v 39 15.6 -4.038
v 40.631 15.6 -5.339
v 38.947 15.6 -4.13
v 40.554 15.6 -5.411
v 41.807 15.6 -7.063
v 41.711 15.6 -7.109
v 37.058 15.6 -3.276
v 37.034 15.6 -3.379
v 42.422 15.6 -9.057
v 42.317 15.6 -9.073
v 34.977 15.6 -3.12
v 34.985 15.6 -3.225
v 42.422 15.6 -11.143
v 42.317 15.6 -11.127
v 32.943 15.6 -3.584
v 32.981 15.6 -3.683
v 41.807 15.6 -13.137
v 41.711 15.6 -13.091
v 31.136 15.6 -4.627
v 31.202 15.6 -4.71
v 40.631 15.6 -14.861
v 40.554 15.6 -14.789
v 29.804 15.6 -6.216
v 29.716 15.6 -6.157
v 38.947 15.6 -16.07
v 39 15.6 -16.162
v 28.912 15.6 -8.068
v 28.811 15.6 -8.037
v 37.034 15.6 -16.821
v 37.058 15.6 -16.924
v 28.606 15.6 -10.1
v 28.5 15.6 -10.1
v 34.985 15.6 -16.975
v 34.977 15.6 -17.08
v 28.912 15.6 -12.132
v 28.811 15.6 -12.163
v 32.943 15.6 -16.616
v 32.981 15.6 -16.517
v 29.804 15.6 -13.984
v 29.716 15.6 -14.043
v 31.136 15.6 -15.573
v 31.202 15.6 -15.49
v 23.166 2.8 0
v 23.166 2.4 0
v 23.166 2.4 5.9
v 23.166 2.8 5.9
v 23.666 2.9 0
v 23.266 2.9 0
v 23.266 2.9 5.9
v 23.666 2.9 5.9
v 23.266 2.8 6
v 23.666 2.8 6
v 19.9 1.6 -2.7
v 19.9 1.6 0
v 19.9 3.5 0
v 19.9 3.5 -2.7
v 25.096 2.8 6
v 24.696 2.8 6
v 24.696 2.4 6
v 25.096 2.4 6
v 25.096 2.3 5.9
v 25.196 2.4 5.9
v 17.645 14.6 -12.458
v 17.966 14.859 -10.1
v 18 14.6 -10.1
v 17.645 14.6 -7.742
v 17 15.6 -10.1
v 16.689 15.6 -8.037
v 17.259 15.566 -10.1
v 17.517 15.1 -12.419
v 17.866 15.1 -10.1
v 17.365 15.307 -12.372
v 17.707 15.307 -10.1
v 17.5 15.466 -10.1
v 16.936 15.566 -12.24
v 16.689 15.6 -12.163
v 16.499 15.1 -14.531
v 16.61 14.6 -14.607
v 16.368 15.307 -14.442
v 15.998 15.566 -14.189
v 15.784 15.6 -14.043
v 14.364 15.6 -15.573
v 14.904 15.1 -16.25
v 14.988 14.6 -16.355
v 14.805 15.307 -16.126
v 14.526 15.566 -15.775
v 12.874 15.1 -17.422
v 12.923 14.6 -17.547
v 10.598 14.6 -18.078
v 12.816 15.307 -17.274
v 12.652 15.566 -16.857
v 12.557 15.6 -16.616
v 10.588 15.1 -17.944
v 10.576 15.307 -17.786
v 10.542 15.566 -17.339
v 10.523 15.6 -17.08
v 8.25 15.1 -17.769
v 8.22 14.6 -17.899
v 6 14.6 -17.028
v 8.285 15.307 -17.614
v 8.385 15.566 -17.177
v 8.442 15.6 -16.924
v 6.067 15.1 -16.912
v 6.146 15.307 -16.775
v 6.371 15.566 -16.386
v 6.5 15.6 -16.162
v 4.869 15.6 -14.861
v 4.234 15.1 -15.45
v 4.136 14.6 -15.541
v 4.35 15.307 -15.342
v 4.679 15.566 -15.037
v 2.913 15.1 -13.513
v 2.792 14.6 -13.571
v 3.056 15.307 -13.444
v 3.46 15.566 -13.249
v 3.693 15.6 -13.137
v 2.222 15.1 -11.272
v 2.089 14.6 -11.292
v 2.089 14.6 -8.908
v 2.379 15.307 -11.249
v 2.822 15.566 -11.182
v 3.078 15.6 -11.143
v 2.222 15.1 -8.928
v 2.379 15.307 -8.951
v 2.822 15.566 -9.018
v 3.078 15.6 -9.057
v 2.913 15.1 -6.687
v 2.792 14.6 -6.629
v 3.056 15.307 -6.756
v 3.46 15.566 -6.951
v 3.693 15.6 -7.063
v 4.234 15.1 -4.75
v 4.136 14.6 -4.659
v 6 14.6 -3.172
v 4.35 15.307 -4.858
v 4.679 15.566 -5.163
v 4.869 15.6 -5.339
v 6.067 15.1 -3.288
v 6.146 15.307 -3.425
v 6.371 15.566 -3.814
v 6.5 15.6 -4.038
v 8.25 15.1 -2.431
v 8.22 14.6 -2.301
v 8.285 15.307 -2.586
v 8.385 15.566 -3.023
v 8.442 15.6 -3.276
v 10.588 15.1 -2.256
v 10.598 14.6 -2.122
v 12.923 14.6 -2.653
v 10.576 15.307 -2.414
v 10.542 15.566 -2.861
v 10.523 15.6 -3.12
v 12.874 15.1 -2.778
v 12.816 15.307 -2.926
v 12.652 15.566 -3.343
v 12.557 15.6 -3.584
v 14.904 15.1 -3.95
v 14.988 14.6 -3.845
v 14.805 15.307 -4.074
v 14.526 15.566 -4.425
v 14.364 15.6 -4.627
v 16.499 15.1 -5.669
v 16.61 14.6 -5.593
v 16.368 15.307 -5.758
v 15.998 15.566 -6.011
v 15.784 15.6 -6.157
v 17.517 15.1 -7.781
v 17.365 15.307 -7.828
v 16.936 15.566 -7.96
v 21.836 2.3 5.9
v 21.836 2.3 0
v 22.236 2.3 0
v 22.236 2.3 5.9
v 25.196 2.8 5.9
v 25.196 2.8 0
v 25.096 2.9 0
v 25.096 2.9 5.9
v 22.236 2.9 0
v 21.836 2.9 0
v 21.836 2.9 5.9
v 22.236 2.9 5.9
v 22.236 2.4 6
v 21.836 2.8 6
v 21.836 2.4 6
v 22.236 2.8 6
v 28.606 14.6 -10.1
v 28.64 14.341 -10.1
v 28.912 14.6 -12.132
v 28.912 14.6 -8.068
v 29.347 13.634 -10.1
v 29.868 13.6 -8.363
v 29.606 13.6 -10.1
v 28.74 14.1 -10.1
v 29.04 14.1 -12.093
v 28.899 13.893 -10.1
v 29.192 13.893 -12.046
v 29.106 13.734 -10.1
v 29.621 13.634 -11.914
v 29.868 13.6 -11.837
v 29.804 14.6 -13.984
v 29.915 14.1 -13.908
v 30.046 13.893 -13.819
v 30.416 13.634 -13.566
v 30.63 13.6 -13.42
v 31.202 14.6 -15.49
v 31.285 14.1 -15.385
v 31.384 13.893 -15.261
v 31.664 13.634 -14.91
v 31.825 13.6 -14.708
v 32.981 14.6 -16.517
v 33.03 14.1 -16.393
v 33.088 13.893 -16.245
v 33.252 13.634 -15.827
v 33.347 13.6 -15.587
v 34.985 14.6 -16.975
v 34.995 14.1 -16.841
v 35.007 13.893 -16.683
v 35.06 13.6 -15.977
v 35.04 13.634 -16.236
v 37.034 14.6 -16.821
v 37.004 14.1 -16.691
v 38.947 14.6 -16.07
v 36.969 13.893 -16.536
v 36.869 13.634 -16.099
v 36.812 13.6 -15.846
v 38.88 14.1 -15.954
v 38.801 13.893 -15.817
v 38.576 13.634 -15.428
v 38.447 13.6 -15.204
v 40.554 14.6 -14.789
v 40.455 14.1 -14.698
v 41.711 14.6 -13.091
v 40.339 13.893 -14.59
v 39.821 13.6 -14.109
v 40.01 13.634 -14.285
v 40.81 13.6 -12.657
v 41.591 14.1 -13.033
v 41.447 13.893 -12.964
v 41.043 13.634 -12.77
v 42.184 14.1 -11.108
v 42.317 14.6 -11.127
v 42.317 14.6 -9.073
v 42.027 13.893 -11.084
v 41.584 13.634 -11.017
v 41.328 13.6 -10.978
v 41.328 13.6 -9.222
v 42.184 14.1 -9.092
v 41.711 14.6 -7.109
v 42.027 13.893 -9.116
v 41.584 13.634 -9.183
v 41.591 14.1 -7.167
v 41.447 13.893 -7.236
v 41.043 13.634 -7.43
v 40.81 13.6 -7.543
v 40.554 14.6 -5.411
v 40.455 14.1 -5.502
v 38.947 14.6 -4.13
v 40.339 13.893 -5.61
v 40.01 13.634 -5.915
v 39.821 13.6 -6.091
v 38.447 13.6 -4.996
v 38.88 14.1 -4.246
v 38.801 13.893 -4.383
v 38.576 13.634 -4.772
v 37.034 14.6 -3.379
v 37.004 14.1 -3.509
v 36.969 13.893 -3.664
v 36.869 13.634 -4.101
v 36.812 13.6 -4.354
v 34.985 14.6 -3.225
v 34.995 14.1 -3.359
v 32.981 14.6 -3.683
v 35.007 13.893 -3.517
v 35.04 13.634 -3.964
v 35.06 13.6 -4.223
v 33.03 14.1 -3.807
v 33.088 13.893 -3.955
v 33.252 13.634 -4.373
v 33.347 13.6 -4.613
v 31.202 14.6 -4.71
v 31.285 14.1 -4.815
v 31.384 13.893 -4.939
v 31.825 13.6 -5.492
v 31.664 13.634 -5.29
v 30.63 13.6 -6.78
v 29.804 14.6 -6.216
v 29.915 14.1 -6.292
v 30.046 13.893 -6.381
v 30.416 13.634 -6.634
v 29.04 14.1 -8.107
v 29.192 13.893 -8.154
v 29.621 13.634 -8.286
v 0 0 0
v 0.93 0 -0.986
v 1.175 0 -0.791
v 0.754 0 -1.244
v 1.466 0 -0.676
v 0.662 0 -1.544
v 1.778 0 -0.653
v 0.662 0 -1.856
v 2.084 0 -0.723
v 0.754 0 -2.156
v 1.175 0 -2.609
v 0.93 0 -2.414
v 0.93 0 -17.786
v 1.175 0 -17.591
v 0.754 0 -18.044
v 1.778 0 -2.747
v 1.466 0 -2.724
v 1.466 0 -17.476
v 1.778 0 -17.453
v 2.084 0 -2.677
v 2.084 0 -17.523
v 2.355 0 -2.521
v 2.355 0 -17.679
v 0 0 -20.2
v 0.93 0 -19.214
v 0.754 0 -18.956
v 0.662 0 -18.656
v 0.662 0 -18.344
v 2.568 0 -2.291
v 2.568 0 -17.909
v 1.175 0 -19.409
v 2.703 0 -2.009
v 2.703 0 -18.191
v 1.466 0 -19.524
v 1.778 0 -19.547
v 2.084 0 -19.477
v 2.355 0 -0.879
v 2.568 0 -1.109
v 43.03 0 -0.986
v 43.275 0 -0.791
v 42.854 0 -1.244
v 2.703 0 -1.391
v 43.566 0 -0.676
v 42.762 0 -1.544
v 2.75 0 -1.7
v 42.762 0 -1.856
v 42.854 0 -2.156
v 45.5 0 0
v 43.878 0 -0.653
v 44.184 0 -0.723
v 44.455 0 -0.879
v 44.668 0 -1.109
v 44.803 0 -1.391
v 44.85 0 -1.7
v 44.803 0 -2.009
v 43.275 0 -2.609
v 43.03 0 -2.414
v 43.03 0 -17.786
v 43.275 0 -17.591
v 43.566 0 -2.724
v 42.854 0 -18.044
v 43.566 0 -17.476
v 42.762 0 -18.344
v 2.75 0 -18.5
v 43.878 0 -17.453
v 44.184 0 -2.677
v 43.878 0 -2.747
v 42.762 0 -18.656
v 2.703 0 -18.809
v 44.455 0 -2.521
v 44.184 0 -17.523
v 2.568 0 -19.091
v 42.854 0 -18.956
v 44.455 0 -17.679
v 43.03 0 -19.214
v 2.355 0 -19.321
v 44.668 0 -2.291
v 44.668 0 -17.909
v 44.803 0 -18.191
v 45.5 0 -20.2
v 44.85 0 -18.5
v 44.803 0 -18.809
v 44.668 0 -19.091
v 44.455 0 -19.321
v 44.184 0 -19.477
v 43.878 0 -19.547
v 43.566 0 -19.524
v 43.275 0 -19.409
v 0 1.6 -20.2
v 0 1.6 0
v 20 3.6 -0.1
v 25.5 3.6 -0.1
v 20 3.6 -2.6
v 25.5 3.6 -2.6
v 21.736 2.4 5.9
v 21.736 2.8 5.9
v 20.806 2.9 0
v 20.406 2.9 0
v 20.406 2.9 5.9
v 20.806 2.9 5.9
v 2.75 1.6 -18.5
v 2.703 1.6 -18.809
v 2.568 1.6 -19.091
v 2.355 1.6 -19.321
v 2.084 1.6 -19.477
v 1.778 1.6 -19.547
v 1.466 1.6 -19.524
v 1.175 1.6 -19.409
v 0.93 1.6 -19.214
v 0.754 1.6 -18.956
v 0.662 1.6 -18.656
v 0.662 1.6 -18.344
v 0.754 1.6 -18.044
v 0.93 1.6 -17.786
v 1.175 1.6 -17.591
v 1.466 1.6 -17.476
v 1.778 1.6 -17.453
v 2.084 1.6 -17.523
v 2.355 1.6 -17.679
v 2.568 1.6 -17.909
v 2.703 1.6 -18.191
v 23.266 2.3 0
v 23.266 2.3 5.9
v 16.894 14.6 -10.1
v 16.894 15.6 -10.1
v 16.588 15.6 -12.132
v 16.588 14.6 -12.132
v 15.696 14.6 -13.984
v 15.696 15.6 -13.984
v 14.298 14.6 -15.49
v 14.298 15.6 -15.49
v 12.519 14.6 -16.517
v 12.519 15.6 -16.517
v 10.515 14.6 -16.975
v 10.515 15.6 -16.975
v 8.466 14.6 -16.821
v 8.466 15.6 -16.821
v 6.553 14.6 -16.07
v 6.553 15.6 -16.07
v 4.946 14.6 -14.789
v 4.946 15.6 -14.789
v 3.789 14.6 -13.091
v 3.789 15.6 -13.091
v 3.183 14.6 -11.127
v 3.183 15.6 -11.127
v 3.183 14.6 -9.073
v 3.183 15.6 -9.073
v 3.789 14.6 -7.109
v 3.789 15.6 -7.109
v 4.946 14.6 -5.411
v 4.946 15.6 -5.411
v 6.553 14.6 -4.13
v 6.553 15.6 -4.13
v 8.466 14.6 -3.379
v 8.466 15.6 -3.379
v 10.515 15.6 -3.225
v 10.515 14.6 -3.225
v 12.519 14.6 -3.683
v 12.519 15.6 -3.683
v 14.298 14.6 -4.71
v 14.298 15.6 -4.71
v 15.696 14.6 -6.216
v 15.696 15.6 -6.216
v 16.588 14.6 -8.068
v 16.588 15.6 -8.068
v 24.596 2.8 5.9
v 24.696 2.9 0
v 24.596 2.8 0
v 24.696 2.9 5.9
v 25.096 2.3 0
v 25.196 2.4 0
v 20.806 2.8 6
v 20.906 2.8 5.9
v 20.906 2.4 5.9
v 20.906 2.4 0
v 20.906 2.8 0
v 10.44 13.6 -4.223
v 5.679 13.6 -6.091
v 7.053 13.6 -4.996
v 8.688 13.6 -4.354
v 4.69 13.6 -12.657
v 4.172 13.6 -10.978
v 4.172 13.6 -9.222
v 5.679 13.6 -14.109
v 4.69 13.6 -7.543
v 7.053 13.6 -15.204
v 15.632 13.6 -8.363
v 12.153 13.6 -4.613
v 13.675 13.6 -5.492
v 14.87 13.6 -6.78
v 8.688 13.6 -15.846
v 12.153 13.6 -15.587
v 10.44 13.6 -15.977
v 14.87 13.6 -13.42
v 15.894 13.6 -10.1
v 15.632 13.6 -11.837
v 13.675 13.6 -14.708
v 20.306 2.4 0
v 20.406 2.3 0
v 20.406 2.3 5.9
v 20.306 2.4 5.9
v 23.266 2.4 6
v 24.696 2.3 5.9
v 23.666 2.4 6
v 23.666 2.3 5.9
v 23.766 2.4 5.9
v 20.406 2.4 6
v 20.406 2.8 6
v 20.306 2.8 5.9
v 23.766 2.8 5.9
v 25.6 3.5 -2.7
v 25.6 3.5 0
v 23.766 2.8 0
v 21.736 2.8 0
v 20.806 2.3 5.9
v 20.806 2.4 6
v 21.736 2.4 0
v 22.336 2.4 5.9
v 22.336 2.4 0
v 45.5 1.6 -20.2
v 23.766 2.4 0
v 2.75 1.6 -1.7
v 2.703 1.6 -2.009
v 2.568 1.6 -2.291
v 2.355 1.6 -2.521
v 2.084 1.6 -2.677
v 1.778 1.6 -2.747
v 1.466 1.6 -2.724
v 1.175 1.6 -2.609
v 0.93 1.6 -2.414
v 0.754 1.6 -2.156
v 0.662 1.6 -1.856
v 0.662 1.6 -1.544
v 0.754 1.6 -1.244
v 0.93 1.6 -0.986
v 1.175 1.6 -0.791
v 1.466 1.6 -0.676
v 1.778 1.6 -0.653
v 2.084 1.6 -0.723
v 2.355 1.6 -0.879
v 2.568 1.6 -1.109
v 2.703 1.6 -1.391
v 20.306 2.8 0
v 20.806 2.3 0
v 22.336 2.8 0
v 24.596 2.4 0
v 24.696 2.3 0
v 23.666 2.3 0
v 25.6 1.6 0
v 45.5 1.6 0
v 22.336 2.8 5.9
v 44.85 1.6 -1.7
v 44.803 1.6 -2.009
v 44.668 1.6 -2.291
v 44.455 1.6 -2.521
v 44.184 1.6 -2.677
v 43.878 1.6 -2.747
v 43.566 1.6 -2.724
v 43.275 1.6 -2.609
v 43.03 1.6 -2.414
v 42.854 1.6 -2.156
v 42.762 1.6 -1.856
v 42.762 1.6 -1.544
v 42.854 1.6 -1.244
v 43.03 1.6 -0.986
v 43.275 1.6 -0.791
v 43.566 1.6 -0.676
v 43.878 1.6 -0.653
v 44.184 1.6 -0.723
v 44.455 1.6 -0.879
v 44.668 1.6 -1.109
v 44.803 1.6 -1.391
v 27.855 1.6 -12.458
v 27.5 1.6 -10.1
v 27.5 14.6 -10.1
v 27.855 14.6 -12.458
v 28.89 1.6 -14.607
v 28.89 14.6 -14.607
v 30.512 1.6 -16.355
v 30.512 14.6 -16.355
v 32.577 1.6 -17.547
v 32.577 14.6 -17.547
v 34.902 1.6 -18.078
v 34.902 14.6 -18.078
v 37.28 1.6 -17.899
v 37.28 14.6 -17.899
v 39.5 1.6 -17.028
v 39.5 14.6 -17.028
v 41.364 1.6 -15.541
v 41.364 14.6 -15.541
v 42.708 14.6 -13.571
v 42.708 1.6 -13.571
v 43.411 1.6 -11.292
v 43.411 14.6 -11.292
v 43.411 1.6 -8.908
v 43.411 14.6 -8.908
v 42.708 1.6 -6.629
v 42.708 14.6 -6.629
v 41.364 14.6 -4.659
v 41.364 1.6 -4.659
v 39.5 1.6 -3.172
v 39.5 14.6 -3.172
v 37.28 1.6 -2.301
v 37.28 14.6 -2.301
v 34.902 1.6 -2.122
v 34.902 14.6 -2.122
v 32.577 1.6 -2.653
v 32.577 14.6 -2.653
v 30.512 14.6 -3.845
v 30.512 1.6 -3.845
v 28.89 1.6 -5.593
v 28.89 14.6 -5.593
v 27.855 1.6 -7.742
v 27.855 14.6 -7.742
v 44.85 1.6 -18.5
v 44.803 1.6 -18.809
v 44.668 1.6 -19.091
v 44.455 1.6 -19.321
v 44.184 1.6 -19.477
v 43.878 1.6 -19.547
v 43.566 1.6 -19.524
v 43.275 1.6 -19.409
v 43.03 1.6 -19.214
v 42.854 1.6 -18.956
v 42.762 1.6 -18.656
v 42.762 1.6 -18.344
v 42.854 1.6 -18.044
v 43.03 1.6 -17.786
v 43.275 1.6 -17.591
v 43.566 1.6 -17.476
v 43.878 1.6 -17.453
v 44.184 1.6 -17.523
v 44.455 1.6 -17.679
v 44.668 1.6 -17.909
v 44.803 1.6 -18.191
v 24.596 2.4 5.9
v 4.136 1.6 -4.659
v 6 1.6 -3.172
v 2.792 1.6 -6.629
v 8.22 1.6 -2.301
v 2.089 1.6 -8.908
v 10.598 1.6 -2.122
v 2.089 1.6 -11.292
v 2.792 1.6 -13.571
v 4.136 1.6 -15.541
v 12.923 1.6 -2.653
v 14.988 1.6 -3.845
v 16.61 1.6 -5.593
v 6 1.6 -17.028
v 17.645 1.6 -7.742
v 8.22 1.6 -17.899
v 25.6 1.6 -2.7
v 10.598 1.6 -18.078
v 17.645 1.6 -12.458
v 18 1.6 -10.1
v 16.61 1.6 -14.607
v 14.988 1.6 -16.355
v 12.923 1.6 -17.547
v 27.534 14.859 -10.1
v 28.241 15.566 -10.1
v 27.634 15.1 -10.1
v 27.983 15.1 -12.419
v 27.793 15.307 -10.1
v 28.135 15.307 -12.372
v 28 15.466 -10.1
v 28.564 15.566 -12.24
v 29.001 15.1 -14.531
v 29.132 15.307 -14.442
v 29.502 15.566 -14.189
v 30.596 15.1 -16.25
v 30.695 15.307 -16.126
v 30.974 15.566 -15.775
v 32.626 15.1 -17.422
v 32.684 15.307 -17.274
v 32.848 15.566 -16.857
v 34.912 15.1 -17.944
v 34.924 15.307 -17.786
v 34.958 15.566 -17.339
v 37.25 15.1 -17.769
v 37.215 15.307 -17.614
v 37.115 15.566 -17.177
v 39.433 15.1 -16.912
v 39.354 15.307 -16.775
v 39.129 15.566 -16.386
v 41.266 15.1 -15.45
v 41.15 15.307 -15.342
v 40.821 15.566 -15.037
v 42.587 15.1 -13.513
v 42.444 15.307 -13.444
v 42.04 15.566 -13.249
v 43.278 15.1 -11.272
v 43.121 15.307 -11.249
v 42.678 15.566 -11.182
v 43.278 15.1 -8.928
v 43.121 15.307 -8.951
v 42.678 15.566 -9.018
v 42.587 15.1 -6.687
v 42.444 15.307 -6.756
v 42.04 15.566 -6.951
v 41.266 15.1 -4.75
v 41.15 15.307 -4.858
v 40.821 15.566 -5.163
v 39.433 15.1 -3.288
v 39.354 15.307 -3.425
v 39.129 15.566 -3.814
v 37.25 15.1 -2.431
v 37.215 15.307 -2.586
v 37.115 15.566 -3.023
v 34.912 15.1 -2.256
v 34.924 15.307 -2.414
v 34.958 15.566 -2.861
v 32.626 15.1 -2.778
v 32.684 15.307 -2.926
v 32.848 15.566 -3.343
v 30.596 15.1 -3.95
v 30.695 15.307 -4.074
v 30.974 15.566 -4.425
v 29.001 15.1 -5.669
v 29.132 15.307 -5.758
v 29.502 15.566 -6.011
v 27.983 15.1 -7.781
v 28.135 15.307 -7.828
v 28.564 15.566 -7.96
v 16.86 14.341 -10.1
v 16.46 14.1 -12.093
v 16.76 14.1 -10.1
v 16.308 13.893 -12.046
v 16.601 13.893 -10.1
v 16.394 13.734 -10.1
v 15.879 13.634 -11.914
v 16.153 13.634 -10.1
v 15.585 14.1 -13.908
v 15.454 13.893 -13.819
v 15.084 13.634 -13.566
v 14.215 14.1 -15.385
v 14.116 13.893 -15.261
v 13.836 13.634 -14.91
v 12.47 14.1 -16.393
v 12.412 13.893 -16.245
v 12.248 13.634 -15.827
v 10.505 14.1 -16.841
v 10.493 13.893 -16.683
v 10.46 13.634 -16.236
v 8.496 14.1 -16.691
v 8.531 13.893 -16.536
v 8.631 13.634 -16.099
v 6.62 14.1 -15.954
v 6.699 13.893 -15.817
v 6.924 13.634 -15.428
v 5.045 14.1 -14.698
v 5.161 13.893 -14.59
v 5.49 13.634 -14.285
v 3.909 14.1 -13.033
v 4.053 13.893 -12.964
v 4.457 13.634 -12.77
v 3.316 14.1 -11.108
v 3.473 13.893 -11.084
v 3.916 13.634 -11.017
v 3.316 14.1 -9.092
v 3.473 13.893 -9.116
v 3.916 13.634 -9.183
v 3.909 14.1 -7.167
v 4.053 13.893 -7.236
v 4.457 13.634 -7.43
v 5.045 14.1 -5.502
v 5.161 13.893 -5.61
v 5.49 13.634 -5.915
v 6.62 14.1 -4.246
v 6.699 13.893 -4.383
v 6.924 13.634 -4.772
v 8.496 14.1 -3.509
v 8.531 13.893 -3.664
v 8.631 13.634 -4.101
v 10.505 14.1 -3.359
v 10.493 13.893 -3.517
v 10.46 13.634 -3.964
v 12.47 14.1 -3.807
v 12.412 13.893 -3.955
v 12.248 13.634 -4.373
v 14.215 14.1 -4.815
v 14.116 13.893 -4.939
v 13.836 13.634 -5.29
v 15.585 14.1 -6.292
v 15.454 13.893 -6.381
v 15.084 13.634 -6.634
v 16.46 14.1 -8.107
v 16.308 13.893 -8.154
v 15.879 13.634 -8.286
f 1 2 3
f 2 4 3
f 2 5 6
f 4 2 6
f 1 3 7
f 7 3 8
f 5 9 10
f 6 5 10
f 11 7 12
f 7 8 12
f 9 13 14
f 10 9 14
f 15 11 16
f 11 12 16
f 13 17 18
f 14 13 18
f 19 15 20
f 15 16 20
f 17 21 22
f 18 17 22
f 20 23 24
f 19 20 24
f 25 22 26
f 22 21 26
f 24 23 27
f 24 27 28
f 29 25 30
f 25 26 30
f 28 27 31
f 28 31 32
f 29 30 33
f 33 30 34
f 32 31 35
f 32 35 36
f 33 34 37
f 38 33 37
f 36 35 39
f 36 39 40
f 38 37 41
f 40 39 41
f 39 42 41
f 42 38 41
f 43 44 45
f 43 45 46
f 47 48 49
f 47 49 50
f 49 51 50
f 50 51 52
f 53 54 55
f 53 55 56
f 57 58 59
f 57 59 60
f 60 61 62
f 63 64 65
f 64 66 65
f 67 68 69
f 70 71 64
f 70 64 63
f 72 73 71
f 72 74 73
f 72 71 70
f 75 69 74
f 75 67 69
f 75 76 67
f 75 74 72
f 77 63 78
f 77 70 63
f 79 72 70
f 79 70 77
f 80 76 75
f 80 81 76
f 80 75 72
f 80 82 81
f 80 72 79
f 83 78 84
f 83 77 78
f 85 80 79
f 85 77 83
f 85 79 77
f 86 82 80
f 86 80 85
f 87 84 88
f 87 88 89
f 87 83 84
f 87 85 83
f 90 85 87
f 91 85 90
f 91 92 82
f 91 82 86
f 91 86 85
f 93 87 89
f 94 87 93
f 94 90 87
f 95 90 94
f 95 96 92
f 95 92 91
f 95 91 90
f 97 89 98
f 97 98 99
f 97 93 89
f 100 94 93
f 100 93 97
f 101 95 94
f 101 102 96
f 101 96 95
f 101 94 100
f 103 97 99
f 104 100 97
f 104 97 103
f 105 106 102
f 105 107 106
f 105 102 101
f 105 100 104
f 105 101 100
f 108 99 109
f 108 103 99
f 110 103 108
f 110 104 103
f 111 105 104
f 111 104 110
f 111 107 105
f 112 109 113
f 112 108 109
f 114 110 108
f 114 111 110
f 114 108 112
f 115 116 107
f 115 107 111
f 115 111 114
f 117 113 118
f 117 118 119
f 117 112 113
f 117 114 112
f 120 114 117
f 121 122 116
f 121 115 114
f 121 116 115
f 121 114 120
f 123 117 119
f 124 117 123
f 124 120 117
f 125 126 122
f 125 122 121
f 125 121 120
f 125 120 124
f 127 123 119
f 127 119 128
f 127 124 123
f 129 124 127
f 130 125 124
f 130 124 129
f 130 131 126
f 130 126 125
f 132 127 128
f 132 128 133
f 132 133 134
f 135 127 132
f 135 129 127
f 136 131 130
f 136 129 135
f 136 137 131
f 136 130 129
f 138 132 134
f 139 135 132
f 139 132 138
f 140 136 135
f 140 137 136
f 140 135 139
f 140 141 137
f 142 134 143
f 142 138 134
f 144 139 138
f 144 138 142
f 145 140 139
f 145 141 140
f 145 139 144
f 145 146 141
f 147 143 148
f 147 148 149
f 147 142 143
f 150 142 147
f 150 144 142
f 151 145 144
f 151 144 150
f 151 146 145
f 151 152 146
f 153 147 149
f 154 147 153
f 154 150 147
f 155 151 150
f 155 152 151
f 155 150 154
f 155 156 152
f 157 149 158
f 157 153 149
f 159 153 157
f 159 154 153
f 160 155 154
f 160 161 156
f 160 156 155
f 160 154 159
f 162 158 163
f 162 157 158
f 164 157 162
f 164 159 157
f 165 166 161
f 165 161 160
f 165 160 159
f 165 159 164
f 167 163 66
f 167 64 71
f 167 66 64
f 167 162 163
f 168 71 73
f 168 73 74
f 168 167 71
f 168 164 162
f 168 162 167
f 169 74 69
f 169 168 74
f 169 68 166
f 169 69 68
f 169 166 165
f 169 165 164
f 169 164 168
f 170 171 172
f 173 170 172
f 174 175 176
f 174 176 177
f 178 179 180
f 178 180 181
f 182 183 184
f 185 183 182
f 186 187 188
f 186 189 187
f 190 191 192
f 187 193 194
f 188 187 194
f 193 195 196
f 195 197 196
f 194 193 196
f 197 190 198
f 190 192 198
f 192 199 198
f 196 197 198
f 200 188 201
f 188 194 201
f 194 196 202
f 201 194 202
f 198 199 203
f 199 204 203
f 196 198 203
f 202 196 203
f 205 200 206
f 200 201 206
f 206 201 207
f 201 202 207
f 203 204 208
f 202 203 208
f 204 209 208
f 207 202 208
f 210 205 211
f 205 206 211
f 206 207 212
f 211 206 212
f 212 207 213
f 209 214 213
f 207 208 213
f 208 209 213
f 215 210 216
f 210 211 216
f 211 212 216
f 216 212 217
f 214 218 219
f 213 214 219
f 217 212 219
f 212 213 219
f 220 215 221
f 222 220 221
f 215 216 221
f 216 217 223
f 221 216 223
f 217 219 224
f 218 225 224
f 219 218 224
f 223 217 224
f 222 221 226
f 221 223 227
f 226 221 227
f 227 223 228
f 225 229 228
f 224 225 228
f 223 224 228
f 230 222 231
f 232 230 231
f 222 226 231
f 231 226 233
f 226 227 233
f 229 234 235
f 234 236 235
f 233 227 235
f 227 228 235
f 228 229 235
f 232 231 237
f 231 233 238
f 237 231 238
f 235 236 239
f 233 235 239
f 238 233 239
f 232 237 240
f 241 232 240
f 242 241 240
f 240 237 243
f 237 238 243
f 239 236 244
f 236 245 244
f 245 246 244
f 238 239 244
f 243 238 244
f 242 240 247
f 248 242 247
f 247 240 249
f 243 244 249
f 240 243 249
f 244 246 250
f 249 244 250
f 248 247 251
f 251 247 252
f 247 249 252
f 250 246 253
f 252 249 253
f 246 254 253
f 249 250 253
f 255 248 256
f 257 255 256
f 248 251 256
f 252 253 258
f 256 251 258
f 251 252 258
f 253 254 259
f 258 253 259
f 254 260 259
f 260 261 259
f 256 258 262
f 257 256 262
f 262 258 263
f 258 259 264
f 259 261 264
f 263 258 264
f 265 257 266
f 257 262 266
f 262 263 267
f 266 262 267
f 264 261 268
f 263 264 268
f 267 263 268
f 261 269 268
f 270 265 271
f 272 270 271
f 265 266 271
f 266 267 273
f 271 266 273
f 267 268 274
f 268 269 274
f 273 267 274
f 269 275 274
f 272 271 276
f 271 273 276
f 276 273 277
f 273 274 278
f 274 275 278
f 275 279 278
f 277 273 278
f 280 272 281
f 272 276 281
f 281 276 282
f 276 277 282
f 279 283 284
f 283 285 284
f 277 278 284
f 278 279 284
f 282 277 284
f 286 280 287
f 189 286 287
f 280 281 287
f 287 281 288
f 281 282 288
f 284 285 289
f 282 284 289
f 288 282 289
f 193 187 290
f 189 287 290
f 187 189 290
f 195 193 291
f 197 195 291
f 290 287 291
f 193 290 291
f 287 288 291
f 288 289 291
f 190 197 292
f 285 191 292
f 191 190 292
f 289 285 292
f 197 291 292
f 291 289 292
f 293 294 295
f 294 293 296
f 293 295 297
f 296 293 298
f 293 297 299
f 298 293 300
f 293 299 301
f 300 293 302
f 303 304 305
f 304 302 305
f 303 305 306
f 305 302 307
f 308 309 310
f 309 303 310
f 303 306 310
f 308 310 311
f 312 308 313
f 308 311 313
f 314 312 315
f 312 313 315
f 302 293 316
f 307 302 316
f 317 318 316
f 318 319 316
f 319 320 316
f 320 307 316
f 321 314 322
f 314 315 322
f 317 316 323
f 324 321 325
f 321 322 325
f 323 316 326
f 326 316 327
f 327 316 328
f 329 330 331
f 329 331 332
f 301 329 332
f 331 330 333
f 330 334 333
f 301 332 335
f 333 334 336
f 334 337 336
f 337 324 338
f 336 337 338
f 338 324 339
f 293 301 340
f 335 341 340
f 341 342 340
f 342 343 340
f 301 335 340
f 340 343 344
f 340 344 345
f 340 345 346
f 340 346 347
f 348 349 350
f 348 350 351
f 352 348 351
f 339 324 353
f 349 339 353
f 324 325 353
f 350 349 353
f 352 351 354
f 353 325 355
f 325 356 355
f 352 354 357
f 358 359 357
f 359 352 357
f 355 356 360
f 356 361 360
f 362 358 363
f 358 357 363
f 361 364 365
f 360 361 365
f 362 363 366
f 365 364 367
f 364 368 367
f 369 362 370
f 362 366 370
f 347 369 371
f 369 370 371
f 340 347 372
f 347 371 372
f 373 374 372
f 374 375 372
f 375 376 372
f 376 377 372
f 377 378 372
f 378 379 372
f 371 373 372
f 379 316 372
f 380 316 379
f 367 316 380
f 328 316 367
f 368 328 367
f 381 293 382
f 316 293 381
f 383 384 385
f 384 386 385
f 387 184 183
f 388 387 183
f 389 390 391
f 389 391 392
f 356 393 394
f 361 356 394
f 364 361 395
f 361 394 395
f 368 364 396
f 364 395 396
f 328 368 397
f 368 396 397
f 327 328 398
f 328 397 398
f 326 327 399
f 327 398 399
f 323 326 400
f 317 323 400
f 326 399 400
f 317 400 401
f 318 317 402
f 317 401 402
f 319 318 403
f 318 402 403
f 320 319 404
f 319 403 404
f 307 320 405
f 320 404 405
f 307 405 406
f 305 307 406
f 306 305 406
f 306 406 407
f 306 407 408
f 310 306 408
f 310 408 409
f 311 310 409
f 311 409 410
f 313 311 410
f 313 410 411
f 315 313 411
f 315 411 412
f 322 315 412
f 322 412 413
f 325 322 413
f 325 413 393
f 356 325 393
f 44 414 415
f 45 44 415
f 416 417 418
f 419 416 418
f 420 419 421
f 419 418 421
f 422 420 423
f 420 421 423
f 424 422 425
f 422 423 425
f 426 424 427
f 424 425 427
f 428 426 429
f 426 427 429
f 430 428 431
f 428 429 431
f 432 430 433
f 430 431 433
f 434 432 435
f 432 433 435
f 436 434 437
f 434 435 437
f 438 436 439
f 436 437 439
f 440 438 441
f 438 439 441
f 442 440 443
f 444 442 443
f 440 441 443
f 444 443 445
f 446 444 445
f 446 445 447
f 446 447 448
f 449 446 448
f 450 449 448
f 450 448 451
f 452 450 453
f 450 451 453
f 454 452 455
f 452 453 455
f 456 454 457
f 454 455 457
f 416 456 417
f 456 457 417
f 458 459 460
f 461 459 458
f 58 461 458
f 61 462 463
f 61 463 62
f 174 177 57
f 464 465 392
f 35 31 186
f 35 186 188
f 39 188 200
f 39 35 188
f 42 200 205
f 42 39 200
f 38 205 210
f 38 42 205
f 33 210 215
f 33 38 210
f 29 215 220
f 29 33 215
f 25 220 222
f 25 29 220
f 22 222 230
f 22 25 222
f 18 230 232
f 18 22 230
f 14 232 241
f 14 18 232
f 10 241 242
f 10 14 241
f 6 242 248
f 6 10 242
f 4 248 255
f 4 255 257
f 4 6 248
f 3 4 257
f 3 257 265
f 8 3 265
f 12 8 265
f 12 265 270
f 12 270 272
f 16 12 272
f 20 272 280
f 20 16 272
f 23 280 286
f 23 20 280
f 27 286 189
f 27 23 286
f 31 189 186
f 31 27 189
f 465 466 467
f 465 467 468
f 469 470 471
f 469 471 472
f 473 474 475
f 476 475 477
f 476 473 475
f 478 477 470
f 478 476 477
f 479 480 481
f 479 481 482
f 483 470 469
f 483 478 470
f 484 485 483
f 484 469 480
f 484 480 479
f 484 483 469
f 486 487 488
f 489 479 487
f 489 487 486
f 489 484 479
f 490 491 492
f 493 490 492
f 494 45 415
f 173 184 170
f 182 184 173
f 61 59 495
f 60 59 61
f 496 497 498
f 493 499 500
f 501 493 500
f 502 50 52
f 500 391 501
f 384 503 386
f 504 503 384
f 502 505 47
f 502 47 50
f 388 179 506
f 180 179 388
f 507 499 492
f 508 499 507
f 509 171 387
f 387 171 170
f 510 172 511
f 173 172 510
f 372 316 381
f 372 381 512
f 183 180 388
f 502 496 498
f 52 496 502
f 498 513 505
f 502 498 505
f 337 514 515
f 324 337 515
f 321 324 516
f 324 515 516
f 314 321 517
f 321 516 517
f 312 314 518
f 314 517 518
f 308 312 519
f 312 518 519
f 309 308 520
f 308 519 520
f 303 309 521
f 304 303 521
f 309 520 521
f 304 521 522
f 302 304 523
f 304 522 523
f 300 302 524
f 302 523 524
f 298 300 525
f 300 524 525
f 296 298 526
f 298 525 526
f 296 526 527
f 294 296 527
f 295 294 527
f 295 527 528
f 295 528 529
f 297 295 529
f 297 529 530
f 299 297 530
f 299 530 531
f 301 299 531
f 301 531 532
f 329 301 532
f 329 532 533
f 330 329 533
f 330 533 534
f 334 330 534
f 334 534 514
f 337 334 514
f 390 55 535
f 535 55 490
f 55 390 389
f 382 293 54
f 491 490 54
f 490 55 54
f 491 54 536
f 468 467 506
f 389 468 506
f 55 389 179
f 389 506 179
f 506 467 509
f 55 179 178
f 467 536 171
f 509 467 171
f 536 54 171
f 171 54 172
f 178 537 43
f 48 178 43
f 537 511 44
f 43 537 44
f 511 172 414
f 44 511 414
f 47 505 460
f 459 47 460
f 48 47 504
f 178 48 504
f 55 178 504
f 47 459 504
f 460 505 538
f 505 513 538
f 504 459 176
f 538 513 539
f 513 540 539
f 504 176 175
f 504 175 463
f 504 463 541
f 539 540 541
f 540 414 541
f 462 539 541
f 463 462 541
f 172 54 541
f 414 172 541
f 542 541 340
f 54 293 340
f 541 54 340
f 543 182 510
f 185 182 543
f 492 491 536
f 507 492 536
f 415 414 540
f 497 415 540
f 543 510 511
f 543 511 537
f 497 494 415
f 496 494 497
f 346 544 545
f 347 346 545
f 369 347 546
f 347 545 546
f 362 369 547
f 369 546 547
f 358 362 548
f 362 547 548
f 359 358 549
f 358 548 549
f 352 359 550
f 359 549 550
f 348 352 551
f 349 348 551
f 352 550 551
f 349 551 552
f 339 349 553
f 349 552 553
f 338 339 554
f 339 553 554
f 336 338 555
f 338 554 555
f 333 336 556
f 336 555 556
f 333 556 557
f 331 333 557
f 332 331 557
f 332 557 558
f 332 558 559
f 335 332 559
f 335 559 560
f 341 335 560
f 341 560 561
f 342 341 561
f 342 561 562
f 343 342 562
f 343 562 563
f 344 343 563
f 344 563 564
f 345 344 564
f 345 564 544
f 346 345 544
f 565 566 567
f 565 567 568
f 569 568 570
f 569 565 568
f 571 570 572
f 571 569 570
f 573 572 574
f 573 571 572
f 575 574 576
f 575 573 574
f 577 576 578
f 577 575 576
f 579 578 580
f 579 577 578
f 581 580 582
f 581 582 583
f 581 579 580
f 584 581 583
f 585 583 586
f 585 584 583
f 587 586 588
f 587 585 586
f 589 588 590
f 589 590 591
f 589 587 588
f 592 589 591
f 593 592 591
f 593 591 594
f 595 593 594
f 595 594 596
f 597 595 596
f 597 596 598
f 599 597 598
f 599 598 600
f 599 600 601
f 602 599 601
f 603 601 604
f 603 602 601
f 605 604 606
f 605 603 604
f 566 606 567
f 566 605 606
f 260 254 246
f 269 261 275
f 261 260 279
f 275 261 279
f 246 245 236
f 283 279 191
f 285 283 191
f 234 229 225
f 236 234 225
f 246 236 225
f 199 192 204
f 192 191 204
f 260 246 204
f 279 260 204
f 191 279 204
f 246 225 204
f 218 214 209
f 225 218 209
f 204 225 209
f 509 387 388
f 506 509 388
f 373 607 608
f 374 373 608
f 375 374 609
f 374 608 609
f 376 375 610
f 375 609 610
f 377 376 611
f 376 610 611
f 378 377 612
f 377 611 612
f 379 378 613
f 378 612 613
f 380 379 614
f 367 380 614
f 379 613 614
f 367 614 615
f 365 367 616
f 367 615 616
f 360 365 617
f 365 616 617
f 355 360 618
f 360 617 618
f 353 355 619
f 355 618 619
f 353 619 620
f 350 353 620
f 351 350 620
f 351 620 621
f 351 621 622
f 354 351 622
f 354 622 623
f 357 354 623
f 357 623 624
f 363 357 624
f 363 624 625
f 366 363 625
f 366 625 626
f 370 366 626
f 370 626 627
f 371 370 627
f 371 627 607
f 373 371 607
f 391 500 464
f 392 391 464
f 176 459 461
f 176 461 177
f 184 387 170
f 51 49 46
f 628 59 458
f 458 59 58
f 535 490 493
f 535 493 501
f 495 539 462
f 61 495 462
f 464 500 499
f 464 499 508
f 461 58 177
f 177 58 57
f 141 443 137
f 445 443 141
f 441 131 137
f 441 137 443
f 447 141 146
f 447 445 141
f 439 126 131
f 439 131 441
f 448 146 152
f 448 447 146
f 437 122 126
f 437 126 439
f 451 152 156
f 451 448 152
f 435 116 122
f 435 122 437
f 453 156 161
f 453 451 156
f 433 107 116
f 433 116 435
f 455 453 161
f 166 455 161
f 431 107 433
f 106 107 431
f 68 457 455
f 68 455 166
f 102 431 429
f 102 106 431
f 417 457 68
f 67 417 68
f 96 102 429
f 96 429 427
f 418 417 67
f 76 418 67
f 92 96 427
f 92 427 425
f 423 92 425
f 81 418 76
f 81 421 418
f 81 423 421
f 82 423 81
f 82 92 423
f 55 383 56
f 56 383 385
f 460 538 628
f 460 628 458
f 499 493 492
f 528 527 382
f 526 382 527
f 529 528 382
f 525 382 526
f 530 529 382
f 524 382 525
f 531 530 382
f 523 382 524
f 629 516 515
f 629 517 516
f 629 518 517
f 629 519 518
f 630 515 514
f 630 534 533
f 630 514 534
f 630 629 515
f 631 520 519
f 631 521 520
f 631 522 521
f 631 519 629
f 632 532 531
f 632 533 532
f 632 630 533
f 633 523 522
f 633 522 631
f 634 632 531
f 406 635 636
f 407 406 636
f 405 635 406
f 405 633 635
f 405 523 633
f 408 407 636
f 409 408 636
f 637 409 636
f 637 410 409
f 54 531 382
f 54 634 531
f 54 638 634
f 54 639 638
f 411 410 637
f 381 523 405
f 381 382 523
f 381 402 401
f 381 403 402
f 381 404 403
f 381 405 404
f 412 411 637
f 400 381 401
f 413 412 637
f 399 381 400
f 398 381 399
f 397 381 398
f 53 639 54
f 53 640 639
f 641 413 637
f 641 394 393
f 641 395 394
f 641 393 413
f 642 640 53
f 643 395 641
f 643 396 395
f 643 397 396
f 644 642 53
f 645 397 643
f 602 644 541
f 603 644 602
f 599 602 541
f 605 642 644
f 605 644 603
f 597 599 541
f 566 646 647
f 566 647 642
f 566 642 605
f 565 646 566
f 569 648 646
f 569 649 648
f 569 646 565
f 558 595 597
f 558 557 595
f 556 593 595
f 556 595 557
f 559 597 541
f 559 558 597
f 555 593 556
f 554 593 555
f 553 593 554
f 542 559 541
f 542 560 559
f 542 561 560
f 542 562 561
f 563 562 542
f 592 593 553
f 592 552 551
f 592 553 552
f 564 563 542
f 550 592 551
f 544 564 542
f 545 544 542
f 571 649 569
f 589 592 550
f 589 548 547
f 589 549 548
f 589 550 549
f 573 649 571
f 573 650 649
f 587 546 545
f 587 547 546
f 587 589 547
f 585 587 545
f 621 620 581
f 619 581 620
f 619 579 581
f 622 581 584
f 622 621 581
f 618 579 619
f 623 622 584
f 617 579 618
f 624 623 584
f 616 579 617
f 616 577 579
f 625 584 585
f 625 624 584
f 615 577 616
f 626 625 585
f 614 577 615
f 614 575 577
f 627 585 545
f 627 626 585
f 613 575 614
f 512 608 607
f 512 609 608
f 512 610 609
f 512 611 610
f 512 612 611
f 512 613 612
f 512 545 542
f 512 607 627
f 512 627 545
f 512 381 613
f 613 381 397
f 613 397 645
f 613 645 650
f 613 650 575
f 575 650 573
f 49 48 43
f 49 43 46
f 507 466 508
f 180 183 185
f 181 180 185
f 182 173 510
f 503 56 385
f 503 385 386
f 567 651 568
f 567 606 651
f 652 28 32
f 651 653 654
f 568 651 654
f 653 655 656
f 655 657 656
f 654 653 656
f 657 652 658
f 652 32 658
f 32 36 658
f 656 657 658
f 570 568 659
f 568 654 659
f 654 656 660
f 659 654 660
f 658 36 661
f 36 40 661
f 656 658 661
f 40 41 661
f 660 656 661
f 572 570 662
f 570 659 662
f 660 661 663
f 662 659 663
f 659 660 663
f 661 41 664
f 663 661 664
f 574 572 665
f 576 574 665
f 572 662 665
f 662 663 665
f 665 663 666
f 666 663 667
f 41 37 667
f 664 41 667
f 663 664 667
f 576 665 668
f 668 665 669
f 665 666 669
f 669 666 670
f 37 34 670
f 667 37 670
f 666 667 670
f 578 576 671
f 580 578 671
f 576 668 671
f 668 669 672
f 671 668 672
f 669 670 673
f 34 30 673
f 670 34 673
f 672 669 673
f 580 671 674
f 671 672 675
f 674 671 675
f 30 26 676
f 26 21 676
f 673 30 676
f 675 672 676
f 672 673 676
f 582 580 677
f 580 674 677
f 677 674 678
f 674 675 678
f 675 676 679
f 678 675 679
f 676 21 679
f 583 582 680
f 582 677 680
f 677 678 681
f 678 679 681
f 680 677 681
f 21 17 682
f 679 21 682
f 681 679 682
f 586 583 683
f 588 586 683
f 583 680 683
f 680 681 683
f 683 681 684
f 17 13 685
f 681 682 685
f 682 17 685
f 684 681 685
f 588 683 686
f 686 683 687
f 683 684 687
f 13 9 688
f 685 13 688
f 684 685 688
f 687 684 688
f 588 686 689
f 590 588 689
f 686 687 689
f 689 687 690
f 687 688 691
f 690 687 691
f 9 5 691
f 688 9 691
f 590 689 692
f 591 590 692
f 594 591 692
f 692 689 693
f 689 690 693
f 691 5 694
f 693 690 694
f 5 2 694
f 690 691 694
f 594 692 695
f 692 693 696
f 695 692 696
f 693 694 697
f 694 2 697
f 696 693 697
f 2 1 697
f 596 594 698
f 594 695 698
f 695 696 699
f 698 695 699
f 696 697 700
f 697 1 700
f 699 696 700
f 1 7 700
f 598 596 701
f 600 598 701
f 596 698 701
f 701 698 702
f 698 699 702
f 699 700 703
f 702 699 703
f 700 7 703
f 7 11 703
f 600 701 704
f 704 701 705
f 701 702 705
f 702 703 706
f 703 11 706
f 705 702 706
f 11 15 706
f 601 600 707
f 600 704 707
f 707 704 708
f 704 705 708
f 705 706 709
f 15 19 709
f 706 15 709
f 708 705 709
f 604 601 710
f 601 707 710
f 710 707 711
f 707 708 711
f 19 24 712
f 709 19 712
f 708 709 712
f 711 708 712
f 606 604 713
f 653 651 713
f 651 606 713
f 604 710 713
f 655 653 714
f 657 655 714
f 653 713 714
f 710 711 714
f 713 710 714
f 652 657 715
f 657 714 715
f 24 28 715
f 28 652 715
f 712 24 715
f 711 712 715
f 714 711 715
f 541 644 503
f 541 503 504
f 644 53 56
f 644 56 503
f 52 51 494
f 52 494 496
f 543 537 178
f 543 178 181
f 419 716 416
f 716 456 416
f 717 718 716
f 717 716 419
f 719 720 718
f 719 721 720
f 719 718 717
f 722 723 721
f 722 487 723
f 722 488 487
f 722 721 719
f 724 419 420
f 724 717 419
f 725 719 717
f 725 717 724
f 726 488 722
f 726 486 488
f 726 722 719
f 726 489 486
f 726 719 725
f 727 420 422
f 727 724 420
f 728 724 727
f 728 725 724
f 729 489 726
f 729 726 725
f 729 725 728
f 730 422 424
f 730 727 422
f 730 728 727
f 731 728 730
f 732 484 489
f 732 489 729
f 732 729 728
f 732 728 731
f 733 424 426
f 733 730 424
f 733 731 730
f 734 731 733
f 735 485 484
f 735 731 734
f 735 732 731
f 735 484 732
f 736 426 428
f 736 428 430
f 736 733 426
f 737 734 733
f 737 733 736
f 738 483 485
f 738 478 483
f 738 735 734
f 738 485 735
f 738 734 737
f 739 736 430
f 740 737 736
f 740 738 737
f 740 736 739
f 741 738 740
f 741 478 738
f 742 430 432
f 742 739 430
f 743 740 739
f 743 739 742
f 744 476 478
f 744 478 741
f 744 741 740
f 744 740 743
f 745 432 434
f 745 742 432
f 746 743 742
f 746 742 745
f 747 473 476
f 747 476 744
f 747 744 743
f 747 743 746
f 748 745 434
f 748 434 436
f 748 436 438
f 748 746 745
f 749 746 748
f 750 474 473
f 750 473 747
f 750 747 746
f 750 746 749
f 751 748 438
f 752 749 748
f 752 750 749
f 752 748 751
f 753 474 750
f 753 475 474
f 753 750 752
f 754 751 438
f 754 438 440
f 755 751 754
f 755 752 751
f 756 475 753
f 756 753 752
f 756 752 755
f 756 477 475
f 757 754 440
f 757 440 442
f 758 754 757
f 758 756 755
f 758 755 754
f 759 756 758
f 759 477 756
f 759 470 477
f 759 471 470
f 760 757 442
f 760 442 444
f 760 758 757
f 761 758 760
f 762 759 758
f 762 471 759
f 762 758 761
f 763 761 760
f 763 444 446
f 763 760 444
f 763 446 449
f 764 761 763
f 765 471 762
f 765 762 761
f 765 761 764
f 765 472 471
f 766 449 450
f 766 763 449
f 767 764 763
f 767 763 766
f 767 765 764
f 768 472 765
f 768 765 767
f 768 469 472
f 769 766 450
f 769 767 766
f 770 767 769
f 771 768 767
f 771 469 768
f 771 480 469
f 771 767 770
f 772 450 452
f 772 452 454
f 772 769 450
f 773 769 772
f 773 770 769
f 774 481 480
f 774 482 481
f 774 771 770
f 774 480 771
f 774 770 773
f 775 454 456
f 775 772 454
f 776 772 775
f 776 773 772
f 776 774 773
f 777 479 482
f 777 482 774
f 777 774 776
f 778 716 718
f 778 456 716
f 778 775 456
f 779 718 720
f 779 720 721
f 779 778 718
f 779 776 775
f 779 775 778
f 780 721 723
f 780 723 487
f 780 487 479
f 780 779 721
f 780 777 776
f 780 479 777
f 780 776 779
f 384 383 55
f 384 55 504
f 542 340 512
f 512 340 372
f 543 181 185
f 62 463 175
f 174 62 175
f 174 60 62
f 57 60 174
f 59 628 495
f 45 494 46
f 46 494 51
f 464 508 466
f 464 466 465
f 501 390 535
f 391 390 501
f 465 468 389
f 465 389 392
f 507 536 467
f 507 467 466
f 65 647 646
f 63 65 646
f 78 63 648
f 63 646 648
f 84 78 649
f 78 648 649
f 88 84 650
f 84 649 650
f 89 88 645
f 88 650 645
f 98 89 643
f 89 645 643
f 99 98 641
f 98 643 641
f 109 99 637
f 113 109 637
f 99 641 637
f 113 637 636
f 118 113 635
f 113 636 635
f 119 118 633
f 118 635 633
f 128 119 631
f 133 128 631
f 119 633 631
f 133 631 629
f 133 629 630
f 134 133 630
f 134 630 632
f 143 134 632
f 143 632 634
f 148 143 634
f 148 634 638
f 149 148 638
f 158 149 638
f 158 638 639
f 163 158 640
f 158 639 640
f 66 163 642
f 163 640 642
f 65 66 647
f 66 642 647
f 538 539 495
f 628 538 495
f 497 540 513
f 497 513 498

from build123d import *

# Parameters (mm, degrees)
SKETCH1_W            = 45.5
SKETCH1_H            = 20.2
BOSS_EXTRUDE1_DEPTH  = 1.6
SKETCH2_R            = 8
BOSS_EXTRUDE2_DEPTH  = 14
SKETCH3_R            = 6.893962295
CUT_EXTRUDE1_DEPTH   = 2
FILLET1_R            = 1
FILLET2_R            = 1
FILLET1_OF_MIRROR1_R = 1
FILLET2_OF_MIRROR1_R = 1
BOSS_EXTRUDE3_DEPTH  = 2
SKETCH5_W            = 0.6
SKETCH5_H            = 0.6
BOSS_EXTRUDE4_DEPTH  = 6
CHAMFER1_SIZE        = 0.1
CHAMFER2_SIZE        = 0.1
CUT_EXTRUDE2_REACH   = 53.714
SKETCH6_R            = 1.05


with BuildPart() as part:
    # Sketch1 → Boss-Extrude1 (new body)
    with BuildSketch(Plane(origin=(0, 0, 0), x_dir=(1, 0, 0), z_dir=(0, 1, 0))):
        with Locations((22.75, 10.1)):
            Rectangle(SKETCH1_W, SKETCH1_H)
    extrude(amount=BOSS_EXTRUDE1_DEPTH)

    # Sketch2 → Boss-Extrude2 (add)
    with BuildSketch(Plane(origin=(0, 1.6, 0), x_dir=(1, 0, 0), z_dir=(0, 1, 0))):
        with Locations((10, 10.1)):
            Circle(SKETCH2_R)
    boss_extrude2 = extrude(amount=BOSS_EXTRUDE2_DEPTH)

    # Sketch3 → Cut-Extrude1 (cut)
    with BuildSketch(Plane(origin=(0, 15.6, 0), x_dir=(1, 0, 0), z_dir=(0, 1, 0))):
        with Locations((10, 10.1)):
            Circle(SKETCH3_R)
    cut_extrude1 = extrude(amount=-CUT_EXTRUDE1_DEPTH, mode=Mode.SUBTRACT)

    # Fillet1
    fillet1_edges = [part.edges().sort_by_distance(p)[0] for p in [
        (2, 15.6, -10.1),
    ]]
    fillet(fillet1_edges, radius=FILLET1_R)

    # Fillet2
    fillet2_edges = [part.edges().sort_by_distance(p)[0] for p in [
        (3.106037705, 13.6, -10.1),
    ]]
    fillet(fillet2_edges, radius=FILLET2_R)

    # Mirror1: Boss-Extrude2, Cut-Extrude1 across plane
    add(boss_extrude2.mirror(Plane(origin=(22.75, 0, 0), x_dir=(0, 0, 1), z_dir=(1, 0, 0))))
    add(cut_extrude1.mirror(Plane(origin=(22.75, 0, 0), x_dir=(0, 0, 1), z_dir=(1, 0, 0))), mode=Mode.SUBTRACT)

    # Fillet1 of Mirror1
    fillet1_of_mirror1_edges = [part.edges().sort_by_distance(p)[0] for p in [
        (43.5, 15.6, -10.1),
    ]]
    fillet(fillet1_of_mirror1_edges, radius=FILLET1_OF_MIRROR1_R)

    # Fillet2 of Mirror1
    fillet2_of_mirror1_edges = [part.edges().sort_by_distance(p)[0] for p in [
        (42.393962295, 13.6, -10.1),
    ]]
    fillet(fillet2_of_mirror1_edges, radius=FILLET2_OF_MIRROR1_R)

    # Sketch4 → Boss-Extrude3 (add)
    with BuildSketch(Plane(origin=(0, 1.6, 0), x_dir=(1, 0, 0), z_dir=(0, 1, 0))):
        Polygon((22.75, 0), (19.9, 0), (19.9, 2.7), (25.6, 2.7), (25.6, 0), align=None)
    extrude(amount=BOSS_EXTRUDE3_DEPTH)

    # Sketch5 → Boss-Extrude4 (add)
    with BuildSketch(Plane.XY):
        with Locations((20.606248373, 2.6)):
            Rectangle(SKETCH5_W, SKETCH5_H)
        with Locations((22.036248373, 2.6)):
            Rectangle(SKETCH5_W, SKETCH5_H)
        with Locations((23.466248373, 2.6)):
            Rectangle(SKETCH5_W, SKETCH5_H)
        with Locations((24.896248373, 2.6)):
            Rectangle(SKETCH5_W, SKETCH5_H)
    extrude(amount=BOSS_EXTRUDE4_DEPTH)

    # Chamfer1
    chamfer1_edges = [part.edges().sort_by_distance(p)[0] for p in [
        (25.196248373, 2.6, 6),
        (25.196248373, 2.3, 3),
        (24.896248373, 2.3, 6),
        (24.596248373, 2.3, 3),
        (24.596248373, 2.6, 6),
        (25.196248373, 2.9, 3),
        (24.896248373, 2.9, 6),
        (24.596248373, 2.9, 3),
        (23.766248373, 2.6, 6),
        (23.766248373, 2.3, 3),
        (23.466248373, 2.3, 6),
        (23.166248373, 2.3, 3),
        (23.166248373, 2.6, 6),
        (23.166248373, 2.9, 3),
        (23.466248373, 2.9, 6),
        (23.766248373, 2.9, 3),
        (22.336248373, 2.6, 6),
        (22.336248373, 2.3, 3),
        (22.036248373, 2.3, 6),
        (21.736248373, 2.3, 3),
        (21.736248373, 2.6, 6),
        (22.336248373, 2.9, 3),
        (22.036248373, 2.9, 6),
        (21.736248373, 2.9, 3),
        (20.606248373, 2.3, 6),
        (20.306248373, 2.3, 3),
        (20.306248373, 2.6, 6),
        (20.306248373, 2.9, 3),
        (20.606248373, 2.9, 6),
        (20.906248373, 2.3, 3),
        (20.906248373, 2.6, 6),
        (20.906248373, 2.9, 3),
    ]]
    chamfer(chamfer1_edges, length=CHAMFER1_SIZE)

    # Chamfer2
    chamfer2_edges = [part.edges().sort_by_distance(p)[0] for p in [
        (19.9, 3.6, -1.35),
        (22.75, 3.6, -2.7),
        (25.6, 3.6, -1.35),
        (22.75, 3.6, 0),
    ]]
    chamfer(chamfer2_edges, length=CHAMFER2_SIZE)

    # Sketch6 → Cut-Extrude2 (cut, up to next)
    with BuildSketch(Plane(origin=(0, 1.6, 0), x_dir=(1, 0, 0), z_dir=(0, 1, 0)), mode=Mode.PRIVATE) as cut_extrude2_sk1:
        with Locations((1.7, 18.5)):
            Circle(SKETCH6_R)
    cut_extrude2_tool1 = extrude(cut_extrude2_sk1.sketch, amount=-CUT_EXTRUDE2_REACH, mode=Mode.PRIVATE) & part.part
    # Sketch6 → Cut-Extrude2 (cut, up to next)
    with BuildSketch(Plane(origin=(0, 1.6, 0), x_dir=(1, 0, 0), z_dir=(0, 1, 0)), mode=Mode.PRIVATE) as cut_extrude2_sk2:
        with Locations((1.7, 1.7)):
            Circle(SKETCH6_R)
    cut_extrude2_tool2 = extrude(cut_extrude2_sk2.sketch, amount=-CUT_EXTRUDE2_REACH, mode=Mode.PRIVATE) & part.part
    # Sketch6 → Cut-Extrude2 (cut, up to next)
    with BuildSketch(Plane(origin=(0, 1.6, 0), x_dir=(1, 0, 0), z_dir=(0, 1, 0)), mode=Mode.PRIVATE) as cut_extrude2_sk3:
        with Locations((43.8, 1.7)):
            Circle(SKETCH6_R)
    cut_extrude2_tool3 = extrude(cut_extrude2_sk3.sketch, amount=-CUT_EXTRUDE2_REACH, mode=Mode.PRIVATE) & part.part
    # Sketch6 → Cut-Extrude2 (cut, up to next)
    with BuildSketch(Plane(origin=(0, 1.6, 0), x_dir=(1, 0, 0), z_dir=(0, 1, 0)), mode=Mode.PRIVATE) as cut_extrude2_sk4:
        with Locations((43.8, 18.5)):
            Circle(SKETCH6_R)
    cut_extrude2_tool4 = extrude(cut_extrude2_sk4.sketch, amount=-CUT_EXTRUDE2_REACH, mode=Mode.PRIVATE) & part.part
    add(cut_extrude2_tool1.solids().sort_by_distance((1.7, 1.6, -18.5))[0], mode=Mode.SUBTRACT)
    add(cut_extrude2_tool2.solids().sort_by_distance((1.7, 1.6, -1.7))[0], mode=Mode.SUBTRACT)
    add(cut_extrude2_tool3.solids().sort_by_distance((43.8, 1.6, -1.7))[0], mode=Mode.SUBTRACT)
    add(cut_extrude2_tool4.solids().sort_by_distance((43.8, 1.6, -18.5))[0], mode=Mode.SUBTRACT)


solid = part.part
